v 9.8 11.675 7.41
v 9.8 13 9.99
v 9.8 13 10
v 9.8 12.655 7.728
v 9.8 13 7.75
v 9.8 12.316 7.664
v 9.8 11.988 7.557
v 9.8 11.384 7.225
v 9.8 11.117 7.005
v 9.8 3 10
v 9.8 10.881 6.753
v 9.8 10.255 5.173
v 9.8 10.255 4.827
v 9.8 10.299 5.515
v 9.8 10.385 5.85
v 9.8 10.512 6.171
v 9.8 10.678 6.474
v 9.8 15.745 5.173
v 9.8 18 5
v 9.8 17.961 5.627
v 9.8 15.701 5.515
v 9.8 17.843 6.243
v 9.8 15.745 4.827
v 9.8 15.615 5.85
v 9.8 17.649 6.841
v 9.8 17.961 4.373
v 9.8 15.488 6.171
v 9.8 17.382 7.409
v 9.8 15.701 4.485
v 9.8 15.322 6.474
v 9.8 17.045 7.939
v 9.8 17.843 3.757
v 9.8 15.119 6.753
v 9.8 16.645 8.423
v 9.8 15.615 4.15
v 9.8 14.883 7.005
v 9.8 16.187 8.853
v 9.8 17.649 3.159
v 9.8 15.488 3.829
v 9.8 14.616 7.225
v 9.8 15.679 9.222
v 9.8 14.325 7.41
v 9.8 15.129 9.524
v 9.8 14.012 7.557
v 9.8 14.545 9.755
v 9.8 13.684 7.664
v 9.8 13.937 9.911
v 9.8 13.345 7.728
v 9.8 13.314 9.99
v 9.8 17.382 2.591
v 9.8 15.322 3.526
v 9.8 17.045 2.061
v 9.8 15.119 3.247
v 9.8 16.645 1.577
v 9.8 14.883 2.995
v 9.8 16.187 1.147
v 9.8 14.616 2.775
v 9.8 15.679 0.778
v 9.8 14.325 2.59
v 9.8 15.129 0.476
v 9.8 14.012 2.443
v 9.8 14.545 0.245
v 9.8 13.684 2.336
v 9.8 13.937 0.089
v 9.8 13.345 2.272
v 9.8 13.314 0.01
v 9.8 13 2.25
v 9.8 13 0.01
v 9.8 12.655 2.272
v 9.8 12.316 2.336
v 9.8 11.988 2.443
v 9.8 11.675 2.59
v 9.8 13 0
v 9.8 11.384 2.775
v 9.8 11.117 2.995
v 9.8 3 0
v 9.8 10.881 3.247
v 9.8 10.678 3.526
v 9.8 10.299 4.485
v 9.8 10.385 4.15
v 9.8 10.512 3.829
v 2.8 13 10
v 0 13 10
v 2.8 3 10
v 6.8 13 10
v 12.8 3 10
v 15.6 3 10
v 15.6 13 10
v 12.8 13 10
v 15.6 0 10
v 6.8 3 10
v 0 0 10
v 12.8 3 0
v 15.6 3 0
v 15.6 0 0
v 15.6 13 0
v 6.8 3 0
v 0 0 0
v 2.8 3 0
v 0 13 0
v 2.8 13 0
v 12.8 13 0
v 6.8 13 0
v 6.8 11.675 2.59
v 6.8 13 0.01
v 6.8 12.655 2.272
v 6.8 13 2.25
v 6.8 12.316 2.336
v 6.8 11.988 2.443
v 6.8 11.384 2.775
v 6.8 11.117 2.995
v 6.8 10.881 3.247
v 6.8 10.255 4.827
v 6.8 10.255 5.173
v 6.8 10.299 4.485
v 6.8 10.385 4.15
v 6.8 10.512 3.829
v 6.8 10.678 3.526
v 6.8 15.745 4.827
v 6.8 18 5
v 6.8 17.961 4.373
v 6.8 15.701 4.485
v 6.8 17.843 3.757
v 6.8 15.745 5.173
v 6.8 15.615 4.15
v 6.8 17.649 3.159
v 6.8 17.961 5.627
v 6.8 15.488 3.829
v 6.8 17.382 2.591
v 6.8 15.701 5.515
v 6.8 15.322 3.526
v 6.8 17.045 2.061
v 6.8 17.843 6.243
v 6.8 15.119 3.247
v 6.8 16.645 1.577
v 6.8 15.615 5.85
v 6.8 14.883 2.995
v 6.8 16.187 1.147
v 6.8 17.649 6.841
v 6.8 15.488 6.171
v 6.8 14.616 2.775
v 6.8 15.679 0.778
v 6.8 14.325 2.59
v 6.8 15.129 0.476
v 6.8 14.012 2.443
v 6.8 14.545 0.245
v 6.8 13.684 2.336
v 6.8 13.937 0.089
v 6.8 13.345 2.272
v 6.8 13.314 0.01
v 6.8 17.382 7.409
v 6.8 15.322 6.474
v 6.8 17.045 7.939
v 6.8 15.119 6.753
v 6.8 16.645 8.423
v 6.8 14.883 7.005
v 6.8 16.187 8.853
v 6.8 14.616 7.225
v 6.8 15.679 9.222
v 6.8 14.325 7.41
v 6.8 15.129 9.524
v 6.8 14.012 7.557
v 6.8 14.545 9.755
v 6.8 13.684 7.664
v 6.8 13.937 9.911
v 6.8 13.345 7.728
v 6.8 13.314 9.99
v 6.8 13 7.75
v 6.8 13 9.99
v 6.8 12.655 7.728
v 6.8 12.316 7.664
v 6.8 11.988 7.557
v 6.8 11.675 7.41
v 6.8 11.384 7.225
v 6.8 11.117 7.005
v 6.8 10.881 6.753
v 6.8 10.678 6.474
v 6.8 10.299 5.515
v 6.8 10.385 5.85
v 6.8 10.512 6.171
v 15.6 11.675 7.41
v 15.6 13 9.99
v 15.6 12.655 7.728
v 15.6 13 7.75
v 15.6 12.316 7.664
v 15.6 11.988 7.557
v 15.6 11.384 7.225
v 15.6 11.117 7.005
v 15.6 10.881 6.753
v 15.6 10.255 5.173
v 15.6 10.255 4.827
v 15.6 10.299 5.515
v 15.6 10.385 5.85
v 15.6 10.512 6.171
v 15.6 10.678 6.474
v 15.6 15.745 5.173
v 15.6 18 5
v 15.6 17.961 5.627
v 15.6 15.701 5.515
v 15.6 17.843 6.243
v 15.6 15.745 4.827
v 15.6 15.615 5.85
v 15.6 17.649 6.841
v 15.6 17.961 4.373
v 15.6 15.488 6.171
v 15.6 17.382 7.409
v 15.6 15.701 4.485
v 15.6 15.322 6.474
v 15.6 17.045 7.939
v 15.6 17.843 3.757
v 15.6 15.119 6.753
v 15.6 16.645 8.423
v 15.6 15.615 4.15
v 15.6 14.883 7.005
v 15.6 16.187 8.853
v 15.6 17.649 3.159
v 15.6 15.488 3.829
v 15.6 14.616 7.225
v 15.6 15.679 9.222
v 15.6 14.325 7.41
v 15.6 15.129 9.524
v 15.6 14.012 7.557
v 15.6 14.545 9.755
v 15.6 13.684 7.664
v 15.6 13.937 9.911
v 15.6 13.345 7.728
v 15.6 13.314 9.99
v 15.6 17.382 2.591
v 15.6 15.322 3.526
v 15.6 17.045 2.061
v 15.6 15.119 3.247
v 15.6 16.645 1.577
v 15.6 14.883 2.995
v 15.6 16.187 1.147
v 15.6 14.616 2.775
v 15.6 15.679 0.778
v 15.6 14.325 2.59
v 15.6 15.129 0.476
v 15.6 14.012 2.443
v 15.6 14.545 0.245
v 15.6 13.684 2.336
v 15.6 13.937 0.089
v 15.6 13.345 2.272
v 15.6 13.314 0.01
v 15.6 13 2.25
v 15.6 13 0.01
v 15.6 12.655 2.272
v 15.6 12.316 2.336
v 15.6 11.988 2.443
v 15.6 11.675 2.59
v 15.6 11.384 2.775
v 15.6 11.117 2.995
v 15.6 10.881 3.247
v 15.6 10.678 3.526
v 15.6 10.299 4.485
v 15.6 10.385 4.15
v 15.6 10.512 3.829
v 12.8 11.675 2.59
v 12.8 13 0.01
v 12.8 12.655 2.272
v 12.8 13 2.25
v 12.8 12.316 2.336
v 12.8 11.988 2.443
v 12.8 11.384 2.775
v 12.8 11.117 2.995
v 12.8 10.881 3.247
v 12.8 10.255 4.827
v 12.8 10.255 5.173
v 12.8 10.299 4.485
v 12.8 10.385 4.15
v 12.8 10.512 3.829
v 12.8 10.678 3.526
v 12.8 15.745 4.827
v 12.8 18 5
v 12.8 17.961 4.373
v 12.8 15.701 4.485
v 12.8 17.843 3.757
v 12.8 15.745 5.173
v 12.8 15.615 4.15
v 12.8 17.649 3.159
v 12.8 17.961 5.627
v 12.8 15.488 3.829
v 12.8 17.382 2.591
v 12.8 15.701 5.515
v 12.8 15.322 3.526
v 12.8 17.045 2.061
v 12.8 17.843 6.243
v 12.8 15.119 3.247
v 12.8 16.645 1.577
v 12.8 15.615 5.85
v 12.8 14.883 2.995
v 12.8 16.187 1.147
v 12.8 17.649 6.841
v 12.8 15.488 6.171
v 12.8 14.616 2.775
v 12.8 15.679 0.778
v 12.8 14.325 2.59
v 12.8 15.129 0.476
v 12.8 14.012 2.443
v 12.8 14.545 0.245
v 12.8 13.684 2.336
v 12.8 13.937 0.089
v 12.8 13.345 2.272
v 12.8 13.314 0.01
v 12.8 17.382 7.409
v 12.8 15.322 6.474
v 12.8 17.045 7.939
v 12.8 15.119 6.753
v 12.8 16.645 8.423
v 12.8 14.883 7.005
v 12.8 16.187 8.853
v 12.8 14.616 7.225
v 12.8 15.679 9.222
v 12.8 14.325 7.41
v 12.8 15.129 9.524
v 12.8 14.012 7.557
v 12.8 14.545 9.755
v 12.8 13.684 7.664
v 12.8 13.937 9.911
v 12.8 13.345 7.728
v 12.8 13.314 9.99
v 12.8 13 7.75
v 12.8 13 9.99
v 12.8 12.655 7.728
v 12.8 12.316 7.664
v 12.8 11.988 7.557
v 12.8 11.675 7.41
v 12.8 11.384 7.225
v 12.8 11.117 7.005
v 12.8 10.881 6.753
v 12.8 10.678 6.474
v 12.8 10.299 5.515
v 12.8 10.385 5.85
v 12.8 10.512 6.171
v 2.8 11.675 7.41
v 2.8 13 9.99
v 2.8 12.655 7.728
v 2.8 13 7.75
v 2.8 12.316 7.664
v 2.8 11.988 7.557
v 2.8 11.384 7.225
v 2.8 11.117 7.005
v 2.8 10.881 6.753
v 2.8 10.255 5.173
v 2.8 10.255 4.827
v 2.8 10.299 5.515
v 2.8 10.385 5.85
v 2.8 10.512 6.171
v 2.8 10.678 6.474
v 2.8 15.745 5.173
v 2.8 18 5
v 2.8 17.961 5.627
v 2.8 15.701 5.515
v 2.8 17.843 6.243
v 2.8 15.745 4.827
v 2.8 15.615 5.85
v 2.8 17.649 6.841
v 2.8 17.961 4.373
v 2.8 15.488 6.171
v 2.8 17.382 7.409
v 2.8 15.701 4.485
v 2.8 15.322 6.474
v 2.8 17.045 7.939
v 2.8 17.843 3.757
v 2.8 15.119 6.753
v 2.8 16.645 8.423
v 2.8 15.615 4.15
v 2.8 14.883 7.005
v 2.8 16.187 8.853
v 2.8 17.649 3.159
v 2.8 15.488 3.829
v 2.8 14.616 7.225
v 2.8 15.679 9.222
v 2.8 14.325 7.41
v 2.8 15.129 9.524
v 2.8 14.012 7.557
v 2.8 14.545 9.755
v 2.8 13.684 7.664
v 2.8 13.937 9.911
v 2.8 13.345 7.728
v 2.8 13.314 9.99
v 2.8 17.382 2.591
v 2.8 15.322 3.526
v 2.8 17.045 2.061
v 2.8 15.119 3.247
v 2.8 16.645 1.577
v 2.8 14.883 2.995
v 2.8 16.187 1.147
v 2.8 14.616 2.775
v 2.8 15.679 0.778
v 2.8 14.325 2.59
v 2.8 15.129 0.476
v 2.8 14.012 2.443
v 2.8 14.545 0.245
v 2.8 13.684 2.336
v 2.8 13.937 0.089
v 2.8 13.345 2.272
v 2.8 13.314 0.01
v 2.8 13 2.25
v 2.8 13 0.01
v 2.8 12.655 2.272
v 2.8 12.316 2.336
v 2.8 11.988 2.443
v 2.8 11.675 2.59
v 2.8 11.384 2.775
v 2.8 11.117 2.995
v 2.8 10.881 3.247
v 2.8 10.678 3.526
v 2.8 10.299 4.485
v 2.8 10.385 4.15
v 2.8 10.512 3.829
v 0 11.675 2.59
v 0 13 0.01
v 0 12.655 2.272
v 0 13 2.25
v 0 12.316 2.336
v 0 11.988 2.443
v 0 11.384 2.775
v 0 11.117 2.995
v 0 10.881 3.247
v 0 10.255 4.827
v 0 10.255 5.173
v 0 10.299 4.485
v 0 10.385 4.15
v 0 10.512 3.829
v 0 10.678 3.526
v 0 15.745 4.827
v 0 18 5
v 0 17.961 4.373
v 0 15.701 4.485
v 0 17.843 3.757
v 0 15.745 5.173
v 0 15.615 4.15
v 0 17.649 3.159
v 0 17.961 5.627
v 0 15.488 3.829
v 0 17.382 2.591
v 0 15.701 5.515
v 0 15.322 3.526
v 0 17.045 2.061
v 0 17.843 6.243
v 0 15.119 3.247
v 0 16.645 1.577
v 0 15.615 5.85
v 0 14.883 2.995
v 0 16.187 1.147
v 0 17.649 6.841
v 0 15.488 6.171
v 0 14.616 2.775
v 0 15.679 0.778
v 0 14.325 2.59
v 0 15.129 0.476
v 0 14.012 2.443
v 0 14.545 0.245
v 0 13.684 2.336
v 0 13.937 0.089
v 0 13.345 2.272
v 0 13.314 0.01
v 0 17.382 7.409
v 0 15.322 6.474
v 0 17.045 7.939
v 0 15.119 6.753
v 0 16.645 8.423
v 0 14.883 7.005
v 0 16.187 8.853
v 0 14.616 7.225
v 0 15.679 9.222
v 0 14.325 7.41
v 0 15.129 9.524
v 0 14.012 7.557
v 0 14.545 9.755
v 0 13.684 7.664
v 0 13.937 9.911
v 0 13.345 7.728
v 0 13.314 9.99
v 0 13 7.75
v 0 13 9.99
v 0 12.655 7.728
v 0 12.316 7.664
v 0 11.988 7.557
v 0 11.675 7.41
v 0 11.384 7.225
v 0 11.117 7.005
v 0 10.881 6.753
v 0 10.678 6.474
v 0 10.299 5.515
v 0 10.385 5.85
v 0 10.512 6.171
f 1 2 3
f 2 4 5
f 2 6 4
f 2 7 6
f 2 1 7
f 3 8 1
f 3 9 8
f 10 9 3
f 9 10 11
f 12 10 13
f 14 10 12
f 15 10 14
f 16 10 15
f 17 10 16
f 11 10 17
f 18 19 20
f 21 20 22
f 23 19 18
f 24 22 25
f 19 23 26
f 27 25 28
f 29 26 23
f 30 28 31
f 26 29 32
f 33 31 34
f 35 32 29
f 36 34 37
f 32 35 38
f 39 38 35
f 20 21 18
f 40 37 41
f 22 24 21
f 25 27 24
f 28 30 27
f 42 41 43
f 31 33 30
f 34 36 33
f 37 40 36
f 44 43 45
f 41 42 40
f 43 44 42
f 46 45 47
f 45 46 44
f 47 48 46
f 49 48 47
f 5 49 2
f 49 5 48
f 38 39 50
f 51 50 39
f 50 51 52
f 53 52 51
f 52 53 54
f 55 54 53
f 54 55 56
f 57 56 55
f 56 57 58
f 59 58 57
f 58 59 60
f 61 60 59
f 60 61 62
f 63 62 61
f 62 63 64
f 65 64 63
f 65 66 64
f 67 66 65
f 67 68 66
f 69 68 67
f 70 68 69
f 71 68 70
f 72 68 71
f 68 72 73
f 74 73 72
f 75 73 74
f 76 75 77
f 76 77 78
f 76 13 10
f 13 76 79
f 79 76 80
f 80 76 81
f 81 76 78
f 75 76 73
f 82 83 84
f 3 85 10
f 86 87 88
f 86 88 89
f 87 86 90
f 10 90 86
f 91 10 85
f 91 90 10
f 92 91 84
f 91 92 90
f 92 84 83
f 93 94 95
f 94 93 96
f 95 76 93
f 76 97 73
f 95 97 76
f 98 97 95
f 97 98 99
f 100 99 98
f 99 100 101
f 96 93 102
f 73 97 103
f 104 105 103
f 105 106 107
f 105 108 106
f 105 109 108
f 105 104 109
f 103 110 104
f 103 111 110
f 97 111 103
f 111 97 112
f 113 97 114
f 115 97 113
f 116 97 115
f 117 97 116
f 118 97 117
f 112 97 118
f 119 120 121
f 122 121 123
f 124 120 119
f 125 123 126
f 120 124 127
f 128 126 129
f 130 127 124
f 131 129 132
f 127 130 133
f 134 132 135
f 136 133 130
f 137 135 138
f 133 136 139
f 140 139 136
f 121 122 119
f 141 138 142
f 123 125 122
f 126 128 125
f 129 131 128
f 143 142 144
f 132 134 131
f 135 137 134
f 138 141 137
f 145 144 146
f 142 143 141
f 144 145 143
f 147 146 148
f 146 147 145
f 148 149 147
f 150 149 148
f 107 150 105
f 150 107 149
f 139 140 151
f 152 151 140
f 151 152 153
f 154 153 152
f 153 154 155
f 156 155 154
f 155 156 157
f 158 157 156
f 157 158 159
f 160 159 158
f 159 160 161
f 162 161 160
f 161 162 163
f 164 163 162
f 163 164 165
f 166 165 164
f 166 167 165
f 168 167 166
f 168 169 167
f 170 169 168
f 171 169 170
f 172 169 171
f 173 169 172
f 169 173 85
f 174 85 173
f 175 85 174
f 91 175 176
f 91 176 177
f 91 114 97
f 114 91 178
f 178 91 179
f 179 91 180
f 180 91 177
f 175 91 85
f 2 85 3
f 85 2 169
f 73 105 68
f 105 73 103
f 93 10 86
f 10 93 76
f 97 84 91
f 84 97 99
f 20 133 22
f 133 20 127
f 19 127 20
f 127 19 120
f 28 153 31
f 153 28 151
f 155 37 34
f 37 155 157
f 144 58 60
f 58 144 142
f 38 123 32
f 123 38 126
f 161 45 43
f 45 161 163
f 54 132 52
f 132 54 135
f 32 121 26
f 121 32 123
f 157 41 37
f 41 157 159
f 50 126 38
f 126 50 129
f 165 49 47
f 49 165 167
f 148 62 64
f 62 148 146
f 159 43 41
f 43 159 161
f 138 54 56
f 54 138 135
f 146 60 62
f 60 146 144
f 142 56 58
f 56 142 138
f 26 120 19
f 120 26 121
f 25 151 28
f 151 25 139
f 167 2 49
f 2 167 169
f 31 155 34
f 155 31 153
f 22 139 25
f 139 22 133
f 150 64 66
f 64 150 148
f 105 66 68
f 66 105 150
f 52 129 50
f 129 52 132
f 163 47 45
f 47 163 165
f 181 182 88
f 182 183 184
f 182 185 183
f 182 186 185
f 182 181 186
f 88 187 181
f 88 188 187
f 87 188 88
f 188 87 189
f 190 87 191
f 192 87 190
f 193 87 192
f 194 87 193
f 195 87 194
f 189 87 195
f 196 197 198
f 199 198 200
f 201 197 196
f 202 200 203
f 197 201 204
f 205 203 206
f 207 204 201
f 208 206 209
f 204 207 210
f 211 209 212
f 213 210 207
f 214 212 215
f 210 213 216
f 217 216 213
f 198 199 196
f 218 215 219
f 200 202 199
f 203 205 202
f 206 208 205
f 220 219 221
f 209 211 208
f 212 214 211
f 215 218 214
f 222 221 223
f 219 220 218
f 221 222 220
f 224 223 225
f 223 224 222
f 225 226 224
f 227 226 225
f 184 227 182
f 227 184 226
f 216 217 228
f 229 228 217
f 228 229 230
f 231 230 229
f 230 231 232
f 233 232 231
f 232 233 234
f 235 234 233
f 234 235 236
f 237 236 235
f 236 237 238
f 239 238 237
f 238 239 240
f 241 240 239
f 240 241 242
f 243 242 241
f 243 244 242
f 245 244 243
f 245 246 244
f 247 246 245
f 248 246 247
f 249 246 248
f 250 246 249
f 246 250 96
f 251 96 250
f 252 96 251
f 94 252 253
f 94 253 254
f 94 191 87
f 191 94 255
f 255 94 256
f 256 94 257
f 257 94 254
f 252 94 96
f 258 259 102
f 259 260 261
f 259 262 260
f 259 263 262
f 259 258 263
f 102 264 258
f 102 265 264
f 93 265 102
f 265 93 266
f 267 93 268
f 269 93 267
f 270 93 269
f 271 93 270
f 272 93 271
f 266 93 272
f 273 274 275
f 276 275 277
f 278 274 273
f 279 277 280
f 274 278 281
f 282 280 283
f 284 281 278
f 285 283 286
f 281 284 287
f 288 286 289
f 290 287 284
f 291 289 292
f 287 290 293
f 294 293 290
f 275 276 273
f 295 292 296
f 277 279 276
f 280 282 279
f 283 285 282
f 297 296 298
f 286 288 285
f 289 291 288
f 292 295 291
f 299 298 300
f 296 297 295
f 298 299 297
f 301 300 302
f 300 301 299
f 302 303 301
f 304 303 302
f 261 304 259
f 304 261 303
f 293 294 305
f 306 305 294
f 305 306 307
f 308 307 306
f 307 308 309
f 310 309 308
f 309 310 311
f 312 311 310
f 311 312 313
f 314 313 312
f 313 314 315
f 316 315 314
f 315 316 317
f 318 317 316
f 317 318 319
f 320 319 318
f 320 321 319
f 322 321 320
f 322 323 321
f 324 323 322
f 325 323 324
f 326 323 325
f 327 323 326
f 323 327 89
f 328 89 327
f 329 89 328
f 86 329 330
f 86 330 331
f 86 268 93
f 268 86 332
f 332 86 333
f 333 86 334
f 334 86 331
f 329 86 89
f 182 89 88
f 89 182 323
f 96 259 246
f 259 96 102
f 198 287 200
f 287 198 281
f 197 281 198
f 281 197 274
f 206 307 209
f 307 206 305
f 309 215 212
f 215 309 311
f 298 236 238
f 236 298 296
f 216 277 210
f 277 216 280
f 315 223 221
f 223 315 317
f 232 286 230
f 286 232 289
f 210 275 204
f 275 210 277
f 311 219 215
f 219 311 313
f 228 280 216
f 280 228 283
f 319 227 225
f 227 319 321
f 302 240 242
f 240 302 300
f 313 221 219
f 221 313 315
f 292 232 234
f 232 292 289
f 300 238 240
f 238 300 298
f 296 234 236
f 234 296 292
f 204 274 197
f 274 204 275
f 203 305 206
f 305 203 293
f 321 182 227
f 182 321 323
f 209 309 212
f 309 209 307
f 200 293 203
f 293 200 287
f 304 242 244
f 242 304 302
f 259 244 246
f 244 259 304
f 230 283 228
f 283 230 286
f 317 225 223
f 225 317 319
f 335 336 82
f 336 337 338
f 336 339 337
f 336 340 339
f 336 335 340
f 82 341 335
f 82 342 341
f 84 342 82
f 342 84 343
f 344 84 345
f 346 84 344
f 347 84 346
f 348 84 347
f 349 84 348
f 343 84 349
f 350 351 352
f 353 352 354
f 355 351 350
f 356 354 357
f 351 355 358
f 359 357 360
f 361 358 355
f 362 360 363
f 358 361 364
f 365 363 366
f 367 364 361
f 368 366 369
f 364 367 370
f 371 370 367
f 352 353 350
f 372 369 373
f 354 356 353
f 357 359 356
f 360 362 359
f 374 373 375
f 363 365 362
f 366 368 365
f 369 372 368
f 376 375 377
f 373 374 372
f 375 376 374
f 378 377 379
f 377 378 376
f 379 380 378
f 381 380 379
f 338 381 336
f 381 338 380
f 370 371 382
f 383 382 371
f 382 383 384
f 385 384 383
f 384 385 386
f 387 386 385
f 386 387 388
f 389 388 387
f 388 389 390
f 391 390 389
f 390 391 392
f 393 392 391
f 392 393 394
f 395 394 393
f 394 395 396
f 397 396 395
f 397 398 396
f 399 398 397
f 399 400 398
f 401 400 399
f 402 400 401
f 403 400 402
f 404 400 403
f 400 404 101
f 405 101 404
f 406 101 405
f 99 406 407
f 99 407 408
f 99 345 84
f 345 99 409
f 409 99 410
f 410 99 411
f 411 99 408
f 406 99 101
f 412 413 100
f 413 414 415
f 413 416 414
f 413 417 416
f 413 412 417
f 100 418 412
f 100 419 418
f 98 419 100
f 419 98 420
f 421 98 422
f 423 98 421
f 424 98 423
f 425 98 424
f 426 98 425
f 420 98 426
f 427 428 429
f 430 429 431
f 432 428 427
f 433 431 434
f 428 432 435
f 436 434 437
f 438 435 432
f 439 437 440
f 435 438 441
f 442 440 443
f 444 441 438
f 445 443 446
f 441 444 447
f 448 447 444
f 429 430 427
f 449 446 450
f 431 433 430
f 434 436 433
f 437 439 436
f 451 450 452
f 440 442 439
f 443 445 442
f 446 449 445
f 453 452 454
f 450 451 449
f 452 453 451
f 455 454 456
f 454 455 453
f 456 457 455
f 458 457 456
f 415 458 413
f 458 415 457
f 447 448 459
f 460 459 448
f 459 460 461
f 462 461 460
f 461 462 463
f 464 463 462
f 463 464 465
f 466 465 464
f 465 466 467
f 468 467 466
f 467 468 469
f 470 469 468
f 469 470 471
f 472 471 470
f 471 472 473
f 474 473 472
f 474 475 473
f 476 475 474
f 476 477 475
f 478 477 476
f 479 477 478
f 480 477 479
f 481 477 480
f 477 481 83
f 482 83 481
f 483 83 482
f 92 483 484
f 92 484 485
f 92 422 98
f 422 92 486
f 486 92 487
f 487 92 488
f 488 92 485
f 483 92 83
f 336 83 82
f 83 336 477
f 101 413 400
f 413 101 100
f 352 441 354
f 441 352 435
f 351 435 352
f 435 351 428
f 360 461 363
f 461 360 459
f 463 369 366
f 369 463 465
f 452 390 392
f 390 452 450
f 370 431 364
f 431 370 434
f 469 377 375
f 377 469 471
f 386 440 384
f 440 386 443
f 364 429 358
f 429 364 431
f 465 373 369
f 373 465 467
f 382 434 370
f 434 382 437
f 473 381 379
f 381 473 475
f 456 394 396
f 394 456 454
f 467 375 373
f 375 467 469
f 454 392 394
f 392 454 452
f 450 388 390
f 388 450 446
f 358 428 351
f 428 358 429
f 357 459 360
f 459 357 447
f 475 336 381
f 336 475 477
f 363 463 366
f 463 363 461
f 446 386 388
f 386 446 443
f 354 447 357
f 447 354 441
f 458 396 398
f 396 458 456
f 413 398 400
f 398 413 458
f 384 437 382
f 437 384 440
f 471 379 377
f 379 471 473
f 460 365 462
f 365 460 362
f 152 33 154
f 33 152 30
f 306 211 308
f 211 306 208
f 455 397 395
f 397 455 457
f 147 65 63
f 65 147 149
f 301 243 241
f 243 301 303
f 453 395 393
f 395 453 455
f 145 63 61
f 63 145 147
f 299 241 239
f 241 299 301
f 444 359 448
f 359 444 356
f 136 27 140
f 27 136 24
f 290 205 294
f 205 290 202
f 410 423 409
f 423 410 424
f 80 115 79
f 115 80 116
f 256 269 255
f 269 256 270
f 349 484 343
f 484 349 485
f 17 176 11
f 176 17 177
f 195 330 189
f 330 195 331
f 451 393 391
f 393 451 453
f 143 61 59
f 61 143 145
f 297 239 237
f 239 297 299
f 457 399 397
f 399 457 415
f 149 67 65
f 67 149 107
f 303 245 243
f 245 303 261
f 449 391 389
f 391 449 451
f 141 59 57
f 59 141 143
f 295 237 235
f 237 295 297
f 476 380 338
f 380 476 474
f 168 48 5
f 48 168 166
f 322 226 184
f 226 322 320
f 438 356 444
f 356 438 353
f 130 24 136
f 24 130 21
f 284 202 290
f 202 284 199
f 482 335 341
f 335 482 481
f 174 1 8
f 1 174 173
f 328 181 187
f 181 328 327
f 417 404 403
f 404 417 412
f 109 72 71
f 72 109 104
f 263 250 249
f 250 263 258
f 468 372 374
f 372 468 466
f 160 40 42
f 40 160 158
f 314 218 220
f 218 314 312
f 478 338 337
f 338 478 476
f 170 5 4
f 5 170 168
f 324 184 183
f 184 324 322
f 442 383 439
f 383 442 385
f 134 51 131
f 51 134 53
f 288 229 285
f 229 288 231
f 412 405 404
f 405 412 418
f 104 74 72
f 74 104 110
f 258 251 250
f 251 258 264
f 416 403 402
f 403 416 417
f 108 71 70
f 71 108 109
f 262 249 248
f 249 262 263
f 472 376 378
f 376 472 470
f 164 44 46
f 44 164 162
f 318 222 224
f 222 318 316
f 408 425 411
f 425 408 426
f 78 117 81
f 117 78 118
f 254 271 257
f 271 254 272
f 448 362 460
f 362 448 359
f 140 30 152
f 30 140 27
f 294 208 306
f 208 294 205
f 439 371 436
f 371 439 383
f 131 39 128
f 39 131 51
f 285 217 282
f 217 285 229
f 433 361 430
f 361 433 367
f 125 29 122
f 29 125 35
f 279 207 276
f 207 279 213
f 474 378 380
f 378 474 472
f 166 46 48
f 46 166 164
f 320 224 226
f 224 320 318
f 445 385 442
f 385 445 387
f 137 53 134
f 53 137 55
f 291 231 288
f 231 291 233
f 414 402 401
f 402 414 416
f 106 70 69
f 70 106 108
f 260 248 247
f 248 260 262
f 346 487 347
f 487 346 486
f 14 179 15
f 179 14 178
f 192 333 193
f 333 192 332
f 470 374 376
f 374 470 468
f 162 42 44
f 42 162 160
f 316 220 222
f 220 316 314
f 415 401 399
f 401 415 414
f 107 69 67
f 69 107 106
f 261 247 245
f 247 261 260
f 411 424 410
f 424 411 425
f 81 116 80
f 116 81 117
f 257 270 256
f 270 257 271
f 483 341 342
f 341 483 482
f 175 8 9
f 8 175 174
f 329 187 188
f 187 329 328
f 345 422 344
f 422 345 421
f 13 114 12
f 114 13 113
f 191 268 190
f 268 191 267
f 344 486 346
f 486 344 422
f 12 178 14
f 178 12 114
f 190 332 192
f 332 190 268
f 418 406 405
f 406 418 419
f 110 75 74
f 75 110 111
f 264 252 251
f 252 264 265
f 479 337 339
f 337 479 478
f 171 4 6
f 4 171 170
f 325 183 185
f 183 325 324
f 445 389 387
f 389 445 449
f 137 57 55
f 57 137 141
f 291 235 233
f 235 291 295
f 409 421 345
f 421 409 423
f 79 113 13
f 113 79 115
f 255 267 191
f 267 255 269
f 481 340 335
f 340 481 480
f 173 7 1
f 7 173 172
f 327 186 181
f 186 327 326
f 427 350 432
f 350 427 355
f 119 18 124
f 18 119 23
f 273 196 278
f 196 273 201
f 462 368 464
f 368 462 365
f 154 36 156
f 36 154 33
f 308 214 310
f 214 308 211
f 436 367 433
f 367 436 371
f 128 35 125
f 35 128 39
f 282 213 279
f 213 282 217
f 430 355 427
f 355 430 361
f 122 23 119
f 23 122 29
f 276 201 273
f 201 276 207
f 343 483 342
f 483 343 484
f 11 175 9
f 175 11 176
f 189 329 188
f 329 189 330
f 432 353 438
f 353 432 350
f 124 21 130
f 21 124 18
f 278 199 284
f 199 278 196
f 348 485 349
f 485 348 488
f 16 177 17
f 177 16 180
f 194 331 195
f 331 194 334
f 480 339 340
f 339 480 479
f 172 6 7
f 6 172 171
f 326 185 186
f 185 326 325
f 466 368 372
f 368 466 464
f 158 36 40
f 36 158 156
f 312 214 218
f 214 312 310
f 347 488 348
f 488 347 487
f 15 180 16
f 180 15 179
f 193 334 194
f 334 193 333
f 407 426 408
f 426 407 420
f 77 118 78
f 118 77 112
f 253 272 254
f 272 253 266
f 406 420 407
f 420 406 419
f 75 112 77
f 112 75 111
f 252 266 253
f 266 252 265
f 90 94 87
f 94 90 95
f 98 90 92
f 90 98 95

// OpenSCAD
$fn = 50;

// 5.5 diameter
bolt_hole_r = 5.5 / 2;

module GoPro_Connection()
{
	translate([0,3,0])
	{
		difference()
		{
			// tabs
			union()
			{
				cube([2.8,10,10]);
				translate([0,10,5]) rotate([90,0,90]) cylinder(2.8,5,5);
		
				// note: center tab is slightly larger the the other two tabs
				translate([6.8,0,0])
				{
					cube([3,10,10]);
					translate([0,10,5]) rotate([90,0,90]) cylinder(3,5,5);
				}

				translate([12.8,0,0])
				{
					cube([2.8,10,10]);
					translate([0,10,5]) rotate([90,0,90]) cylinder(2.8,5,5);
				}
			}

			// bolt hole
			translate([-7, 10, 5]) rotate([0,90,0]) cylinder(30, bolt_hole_r, bolt_hole_r);
		}
	}

	// connection block
	cube([15.6,3,10]);
}

GoPro_Connection();
